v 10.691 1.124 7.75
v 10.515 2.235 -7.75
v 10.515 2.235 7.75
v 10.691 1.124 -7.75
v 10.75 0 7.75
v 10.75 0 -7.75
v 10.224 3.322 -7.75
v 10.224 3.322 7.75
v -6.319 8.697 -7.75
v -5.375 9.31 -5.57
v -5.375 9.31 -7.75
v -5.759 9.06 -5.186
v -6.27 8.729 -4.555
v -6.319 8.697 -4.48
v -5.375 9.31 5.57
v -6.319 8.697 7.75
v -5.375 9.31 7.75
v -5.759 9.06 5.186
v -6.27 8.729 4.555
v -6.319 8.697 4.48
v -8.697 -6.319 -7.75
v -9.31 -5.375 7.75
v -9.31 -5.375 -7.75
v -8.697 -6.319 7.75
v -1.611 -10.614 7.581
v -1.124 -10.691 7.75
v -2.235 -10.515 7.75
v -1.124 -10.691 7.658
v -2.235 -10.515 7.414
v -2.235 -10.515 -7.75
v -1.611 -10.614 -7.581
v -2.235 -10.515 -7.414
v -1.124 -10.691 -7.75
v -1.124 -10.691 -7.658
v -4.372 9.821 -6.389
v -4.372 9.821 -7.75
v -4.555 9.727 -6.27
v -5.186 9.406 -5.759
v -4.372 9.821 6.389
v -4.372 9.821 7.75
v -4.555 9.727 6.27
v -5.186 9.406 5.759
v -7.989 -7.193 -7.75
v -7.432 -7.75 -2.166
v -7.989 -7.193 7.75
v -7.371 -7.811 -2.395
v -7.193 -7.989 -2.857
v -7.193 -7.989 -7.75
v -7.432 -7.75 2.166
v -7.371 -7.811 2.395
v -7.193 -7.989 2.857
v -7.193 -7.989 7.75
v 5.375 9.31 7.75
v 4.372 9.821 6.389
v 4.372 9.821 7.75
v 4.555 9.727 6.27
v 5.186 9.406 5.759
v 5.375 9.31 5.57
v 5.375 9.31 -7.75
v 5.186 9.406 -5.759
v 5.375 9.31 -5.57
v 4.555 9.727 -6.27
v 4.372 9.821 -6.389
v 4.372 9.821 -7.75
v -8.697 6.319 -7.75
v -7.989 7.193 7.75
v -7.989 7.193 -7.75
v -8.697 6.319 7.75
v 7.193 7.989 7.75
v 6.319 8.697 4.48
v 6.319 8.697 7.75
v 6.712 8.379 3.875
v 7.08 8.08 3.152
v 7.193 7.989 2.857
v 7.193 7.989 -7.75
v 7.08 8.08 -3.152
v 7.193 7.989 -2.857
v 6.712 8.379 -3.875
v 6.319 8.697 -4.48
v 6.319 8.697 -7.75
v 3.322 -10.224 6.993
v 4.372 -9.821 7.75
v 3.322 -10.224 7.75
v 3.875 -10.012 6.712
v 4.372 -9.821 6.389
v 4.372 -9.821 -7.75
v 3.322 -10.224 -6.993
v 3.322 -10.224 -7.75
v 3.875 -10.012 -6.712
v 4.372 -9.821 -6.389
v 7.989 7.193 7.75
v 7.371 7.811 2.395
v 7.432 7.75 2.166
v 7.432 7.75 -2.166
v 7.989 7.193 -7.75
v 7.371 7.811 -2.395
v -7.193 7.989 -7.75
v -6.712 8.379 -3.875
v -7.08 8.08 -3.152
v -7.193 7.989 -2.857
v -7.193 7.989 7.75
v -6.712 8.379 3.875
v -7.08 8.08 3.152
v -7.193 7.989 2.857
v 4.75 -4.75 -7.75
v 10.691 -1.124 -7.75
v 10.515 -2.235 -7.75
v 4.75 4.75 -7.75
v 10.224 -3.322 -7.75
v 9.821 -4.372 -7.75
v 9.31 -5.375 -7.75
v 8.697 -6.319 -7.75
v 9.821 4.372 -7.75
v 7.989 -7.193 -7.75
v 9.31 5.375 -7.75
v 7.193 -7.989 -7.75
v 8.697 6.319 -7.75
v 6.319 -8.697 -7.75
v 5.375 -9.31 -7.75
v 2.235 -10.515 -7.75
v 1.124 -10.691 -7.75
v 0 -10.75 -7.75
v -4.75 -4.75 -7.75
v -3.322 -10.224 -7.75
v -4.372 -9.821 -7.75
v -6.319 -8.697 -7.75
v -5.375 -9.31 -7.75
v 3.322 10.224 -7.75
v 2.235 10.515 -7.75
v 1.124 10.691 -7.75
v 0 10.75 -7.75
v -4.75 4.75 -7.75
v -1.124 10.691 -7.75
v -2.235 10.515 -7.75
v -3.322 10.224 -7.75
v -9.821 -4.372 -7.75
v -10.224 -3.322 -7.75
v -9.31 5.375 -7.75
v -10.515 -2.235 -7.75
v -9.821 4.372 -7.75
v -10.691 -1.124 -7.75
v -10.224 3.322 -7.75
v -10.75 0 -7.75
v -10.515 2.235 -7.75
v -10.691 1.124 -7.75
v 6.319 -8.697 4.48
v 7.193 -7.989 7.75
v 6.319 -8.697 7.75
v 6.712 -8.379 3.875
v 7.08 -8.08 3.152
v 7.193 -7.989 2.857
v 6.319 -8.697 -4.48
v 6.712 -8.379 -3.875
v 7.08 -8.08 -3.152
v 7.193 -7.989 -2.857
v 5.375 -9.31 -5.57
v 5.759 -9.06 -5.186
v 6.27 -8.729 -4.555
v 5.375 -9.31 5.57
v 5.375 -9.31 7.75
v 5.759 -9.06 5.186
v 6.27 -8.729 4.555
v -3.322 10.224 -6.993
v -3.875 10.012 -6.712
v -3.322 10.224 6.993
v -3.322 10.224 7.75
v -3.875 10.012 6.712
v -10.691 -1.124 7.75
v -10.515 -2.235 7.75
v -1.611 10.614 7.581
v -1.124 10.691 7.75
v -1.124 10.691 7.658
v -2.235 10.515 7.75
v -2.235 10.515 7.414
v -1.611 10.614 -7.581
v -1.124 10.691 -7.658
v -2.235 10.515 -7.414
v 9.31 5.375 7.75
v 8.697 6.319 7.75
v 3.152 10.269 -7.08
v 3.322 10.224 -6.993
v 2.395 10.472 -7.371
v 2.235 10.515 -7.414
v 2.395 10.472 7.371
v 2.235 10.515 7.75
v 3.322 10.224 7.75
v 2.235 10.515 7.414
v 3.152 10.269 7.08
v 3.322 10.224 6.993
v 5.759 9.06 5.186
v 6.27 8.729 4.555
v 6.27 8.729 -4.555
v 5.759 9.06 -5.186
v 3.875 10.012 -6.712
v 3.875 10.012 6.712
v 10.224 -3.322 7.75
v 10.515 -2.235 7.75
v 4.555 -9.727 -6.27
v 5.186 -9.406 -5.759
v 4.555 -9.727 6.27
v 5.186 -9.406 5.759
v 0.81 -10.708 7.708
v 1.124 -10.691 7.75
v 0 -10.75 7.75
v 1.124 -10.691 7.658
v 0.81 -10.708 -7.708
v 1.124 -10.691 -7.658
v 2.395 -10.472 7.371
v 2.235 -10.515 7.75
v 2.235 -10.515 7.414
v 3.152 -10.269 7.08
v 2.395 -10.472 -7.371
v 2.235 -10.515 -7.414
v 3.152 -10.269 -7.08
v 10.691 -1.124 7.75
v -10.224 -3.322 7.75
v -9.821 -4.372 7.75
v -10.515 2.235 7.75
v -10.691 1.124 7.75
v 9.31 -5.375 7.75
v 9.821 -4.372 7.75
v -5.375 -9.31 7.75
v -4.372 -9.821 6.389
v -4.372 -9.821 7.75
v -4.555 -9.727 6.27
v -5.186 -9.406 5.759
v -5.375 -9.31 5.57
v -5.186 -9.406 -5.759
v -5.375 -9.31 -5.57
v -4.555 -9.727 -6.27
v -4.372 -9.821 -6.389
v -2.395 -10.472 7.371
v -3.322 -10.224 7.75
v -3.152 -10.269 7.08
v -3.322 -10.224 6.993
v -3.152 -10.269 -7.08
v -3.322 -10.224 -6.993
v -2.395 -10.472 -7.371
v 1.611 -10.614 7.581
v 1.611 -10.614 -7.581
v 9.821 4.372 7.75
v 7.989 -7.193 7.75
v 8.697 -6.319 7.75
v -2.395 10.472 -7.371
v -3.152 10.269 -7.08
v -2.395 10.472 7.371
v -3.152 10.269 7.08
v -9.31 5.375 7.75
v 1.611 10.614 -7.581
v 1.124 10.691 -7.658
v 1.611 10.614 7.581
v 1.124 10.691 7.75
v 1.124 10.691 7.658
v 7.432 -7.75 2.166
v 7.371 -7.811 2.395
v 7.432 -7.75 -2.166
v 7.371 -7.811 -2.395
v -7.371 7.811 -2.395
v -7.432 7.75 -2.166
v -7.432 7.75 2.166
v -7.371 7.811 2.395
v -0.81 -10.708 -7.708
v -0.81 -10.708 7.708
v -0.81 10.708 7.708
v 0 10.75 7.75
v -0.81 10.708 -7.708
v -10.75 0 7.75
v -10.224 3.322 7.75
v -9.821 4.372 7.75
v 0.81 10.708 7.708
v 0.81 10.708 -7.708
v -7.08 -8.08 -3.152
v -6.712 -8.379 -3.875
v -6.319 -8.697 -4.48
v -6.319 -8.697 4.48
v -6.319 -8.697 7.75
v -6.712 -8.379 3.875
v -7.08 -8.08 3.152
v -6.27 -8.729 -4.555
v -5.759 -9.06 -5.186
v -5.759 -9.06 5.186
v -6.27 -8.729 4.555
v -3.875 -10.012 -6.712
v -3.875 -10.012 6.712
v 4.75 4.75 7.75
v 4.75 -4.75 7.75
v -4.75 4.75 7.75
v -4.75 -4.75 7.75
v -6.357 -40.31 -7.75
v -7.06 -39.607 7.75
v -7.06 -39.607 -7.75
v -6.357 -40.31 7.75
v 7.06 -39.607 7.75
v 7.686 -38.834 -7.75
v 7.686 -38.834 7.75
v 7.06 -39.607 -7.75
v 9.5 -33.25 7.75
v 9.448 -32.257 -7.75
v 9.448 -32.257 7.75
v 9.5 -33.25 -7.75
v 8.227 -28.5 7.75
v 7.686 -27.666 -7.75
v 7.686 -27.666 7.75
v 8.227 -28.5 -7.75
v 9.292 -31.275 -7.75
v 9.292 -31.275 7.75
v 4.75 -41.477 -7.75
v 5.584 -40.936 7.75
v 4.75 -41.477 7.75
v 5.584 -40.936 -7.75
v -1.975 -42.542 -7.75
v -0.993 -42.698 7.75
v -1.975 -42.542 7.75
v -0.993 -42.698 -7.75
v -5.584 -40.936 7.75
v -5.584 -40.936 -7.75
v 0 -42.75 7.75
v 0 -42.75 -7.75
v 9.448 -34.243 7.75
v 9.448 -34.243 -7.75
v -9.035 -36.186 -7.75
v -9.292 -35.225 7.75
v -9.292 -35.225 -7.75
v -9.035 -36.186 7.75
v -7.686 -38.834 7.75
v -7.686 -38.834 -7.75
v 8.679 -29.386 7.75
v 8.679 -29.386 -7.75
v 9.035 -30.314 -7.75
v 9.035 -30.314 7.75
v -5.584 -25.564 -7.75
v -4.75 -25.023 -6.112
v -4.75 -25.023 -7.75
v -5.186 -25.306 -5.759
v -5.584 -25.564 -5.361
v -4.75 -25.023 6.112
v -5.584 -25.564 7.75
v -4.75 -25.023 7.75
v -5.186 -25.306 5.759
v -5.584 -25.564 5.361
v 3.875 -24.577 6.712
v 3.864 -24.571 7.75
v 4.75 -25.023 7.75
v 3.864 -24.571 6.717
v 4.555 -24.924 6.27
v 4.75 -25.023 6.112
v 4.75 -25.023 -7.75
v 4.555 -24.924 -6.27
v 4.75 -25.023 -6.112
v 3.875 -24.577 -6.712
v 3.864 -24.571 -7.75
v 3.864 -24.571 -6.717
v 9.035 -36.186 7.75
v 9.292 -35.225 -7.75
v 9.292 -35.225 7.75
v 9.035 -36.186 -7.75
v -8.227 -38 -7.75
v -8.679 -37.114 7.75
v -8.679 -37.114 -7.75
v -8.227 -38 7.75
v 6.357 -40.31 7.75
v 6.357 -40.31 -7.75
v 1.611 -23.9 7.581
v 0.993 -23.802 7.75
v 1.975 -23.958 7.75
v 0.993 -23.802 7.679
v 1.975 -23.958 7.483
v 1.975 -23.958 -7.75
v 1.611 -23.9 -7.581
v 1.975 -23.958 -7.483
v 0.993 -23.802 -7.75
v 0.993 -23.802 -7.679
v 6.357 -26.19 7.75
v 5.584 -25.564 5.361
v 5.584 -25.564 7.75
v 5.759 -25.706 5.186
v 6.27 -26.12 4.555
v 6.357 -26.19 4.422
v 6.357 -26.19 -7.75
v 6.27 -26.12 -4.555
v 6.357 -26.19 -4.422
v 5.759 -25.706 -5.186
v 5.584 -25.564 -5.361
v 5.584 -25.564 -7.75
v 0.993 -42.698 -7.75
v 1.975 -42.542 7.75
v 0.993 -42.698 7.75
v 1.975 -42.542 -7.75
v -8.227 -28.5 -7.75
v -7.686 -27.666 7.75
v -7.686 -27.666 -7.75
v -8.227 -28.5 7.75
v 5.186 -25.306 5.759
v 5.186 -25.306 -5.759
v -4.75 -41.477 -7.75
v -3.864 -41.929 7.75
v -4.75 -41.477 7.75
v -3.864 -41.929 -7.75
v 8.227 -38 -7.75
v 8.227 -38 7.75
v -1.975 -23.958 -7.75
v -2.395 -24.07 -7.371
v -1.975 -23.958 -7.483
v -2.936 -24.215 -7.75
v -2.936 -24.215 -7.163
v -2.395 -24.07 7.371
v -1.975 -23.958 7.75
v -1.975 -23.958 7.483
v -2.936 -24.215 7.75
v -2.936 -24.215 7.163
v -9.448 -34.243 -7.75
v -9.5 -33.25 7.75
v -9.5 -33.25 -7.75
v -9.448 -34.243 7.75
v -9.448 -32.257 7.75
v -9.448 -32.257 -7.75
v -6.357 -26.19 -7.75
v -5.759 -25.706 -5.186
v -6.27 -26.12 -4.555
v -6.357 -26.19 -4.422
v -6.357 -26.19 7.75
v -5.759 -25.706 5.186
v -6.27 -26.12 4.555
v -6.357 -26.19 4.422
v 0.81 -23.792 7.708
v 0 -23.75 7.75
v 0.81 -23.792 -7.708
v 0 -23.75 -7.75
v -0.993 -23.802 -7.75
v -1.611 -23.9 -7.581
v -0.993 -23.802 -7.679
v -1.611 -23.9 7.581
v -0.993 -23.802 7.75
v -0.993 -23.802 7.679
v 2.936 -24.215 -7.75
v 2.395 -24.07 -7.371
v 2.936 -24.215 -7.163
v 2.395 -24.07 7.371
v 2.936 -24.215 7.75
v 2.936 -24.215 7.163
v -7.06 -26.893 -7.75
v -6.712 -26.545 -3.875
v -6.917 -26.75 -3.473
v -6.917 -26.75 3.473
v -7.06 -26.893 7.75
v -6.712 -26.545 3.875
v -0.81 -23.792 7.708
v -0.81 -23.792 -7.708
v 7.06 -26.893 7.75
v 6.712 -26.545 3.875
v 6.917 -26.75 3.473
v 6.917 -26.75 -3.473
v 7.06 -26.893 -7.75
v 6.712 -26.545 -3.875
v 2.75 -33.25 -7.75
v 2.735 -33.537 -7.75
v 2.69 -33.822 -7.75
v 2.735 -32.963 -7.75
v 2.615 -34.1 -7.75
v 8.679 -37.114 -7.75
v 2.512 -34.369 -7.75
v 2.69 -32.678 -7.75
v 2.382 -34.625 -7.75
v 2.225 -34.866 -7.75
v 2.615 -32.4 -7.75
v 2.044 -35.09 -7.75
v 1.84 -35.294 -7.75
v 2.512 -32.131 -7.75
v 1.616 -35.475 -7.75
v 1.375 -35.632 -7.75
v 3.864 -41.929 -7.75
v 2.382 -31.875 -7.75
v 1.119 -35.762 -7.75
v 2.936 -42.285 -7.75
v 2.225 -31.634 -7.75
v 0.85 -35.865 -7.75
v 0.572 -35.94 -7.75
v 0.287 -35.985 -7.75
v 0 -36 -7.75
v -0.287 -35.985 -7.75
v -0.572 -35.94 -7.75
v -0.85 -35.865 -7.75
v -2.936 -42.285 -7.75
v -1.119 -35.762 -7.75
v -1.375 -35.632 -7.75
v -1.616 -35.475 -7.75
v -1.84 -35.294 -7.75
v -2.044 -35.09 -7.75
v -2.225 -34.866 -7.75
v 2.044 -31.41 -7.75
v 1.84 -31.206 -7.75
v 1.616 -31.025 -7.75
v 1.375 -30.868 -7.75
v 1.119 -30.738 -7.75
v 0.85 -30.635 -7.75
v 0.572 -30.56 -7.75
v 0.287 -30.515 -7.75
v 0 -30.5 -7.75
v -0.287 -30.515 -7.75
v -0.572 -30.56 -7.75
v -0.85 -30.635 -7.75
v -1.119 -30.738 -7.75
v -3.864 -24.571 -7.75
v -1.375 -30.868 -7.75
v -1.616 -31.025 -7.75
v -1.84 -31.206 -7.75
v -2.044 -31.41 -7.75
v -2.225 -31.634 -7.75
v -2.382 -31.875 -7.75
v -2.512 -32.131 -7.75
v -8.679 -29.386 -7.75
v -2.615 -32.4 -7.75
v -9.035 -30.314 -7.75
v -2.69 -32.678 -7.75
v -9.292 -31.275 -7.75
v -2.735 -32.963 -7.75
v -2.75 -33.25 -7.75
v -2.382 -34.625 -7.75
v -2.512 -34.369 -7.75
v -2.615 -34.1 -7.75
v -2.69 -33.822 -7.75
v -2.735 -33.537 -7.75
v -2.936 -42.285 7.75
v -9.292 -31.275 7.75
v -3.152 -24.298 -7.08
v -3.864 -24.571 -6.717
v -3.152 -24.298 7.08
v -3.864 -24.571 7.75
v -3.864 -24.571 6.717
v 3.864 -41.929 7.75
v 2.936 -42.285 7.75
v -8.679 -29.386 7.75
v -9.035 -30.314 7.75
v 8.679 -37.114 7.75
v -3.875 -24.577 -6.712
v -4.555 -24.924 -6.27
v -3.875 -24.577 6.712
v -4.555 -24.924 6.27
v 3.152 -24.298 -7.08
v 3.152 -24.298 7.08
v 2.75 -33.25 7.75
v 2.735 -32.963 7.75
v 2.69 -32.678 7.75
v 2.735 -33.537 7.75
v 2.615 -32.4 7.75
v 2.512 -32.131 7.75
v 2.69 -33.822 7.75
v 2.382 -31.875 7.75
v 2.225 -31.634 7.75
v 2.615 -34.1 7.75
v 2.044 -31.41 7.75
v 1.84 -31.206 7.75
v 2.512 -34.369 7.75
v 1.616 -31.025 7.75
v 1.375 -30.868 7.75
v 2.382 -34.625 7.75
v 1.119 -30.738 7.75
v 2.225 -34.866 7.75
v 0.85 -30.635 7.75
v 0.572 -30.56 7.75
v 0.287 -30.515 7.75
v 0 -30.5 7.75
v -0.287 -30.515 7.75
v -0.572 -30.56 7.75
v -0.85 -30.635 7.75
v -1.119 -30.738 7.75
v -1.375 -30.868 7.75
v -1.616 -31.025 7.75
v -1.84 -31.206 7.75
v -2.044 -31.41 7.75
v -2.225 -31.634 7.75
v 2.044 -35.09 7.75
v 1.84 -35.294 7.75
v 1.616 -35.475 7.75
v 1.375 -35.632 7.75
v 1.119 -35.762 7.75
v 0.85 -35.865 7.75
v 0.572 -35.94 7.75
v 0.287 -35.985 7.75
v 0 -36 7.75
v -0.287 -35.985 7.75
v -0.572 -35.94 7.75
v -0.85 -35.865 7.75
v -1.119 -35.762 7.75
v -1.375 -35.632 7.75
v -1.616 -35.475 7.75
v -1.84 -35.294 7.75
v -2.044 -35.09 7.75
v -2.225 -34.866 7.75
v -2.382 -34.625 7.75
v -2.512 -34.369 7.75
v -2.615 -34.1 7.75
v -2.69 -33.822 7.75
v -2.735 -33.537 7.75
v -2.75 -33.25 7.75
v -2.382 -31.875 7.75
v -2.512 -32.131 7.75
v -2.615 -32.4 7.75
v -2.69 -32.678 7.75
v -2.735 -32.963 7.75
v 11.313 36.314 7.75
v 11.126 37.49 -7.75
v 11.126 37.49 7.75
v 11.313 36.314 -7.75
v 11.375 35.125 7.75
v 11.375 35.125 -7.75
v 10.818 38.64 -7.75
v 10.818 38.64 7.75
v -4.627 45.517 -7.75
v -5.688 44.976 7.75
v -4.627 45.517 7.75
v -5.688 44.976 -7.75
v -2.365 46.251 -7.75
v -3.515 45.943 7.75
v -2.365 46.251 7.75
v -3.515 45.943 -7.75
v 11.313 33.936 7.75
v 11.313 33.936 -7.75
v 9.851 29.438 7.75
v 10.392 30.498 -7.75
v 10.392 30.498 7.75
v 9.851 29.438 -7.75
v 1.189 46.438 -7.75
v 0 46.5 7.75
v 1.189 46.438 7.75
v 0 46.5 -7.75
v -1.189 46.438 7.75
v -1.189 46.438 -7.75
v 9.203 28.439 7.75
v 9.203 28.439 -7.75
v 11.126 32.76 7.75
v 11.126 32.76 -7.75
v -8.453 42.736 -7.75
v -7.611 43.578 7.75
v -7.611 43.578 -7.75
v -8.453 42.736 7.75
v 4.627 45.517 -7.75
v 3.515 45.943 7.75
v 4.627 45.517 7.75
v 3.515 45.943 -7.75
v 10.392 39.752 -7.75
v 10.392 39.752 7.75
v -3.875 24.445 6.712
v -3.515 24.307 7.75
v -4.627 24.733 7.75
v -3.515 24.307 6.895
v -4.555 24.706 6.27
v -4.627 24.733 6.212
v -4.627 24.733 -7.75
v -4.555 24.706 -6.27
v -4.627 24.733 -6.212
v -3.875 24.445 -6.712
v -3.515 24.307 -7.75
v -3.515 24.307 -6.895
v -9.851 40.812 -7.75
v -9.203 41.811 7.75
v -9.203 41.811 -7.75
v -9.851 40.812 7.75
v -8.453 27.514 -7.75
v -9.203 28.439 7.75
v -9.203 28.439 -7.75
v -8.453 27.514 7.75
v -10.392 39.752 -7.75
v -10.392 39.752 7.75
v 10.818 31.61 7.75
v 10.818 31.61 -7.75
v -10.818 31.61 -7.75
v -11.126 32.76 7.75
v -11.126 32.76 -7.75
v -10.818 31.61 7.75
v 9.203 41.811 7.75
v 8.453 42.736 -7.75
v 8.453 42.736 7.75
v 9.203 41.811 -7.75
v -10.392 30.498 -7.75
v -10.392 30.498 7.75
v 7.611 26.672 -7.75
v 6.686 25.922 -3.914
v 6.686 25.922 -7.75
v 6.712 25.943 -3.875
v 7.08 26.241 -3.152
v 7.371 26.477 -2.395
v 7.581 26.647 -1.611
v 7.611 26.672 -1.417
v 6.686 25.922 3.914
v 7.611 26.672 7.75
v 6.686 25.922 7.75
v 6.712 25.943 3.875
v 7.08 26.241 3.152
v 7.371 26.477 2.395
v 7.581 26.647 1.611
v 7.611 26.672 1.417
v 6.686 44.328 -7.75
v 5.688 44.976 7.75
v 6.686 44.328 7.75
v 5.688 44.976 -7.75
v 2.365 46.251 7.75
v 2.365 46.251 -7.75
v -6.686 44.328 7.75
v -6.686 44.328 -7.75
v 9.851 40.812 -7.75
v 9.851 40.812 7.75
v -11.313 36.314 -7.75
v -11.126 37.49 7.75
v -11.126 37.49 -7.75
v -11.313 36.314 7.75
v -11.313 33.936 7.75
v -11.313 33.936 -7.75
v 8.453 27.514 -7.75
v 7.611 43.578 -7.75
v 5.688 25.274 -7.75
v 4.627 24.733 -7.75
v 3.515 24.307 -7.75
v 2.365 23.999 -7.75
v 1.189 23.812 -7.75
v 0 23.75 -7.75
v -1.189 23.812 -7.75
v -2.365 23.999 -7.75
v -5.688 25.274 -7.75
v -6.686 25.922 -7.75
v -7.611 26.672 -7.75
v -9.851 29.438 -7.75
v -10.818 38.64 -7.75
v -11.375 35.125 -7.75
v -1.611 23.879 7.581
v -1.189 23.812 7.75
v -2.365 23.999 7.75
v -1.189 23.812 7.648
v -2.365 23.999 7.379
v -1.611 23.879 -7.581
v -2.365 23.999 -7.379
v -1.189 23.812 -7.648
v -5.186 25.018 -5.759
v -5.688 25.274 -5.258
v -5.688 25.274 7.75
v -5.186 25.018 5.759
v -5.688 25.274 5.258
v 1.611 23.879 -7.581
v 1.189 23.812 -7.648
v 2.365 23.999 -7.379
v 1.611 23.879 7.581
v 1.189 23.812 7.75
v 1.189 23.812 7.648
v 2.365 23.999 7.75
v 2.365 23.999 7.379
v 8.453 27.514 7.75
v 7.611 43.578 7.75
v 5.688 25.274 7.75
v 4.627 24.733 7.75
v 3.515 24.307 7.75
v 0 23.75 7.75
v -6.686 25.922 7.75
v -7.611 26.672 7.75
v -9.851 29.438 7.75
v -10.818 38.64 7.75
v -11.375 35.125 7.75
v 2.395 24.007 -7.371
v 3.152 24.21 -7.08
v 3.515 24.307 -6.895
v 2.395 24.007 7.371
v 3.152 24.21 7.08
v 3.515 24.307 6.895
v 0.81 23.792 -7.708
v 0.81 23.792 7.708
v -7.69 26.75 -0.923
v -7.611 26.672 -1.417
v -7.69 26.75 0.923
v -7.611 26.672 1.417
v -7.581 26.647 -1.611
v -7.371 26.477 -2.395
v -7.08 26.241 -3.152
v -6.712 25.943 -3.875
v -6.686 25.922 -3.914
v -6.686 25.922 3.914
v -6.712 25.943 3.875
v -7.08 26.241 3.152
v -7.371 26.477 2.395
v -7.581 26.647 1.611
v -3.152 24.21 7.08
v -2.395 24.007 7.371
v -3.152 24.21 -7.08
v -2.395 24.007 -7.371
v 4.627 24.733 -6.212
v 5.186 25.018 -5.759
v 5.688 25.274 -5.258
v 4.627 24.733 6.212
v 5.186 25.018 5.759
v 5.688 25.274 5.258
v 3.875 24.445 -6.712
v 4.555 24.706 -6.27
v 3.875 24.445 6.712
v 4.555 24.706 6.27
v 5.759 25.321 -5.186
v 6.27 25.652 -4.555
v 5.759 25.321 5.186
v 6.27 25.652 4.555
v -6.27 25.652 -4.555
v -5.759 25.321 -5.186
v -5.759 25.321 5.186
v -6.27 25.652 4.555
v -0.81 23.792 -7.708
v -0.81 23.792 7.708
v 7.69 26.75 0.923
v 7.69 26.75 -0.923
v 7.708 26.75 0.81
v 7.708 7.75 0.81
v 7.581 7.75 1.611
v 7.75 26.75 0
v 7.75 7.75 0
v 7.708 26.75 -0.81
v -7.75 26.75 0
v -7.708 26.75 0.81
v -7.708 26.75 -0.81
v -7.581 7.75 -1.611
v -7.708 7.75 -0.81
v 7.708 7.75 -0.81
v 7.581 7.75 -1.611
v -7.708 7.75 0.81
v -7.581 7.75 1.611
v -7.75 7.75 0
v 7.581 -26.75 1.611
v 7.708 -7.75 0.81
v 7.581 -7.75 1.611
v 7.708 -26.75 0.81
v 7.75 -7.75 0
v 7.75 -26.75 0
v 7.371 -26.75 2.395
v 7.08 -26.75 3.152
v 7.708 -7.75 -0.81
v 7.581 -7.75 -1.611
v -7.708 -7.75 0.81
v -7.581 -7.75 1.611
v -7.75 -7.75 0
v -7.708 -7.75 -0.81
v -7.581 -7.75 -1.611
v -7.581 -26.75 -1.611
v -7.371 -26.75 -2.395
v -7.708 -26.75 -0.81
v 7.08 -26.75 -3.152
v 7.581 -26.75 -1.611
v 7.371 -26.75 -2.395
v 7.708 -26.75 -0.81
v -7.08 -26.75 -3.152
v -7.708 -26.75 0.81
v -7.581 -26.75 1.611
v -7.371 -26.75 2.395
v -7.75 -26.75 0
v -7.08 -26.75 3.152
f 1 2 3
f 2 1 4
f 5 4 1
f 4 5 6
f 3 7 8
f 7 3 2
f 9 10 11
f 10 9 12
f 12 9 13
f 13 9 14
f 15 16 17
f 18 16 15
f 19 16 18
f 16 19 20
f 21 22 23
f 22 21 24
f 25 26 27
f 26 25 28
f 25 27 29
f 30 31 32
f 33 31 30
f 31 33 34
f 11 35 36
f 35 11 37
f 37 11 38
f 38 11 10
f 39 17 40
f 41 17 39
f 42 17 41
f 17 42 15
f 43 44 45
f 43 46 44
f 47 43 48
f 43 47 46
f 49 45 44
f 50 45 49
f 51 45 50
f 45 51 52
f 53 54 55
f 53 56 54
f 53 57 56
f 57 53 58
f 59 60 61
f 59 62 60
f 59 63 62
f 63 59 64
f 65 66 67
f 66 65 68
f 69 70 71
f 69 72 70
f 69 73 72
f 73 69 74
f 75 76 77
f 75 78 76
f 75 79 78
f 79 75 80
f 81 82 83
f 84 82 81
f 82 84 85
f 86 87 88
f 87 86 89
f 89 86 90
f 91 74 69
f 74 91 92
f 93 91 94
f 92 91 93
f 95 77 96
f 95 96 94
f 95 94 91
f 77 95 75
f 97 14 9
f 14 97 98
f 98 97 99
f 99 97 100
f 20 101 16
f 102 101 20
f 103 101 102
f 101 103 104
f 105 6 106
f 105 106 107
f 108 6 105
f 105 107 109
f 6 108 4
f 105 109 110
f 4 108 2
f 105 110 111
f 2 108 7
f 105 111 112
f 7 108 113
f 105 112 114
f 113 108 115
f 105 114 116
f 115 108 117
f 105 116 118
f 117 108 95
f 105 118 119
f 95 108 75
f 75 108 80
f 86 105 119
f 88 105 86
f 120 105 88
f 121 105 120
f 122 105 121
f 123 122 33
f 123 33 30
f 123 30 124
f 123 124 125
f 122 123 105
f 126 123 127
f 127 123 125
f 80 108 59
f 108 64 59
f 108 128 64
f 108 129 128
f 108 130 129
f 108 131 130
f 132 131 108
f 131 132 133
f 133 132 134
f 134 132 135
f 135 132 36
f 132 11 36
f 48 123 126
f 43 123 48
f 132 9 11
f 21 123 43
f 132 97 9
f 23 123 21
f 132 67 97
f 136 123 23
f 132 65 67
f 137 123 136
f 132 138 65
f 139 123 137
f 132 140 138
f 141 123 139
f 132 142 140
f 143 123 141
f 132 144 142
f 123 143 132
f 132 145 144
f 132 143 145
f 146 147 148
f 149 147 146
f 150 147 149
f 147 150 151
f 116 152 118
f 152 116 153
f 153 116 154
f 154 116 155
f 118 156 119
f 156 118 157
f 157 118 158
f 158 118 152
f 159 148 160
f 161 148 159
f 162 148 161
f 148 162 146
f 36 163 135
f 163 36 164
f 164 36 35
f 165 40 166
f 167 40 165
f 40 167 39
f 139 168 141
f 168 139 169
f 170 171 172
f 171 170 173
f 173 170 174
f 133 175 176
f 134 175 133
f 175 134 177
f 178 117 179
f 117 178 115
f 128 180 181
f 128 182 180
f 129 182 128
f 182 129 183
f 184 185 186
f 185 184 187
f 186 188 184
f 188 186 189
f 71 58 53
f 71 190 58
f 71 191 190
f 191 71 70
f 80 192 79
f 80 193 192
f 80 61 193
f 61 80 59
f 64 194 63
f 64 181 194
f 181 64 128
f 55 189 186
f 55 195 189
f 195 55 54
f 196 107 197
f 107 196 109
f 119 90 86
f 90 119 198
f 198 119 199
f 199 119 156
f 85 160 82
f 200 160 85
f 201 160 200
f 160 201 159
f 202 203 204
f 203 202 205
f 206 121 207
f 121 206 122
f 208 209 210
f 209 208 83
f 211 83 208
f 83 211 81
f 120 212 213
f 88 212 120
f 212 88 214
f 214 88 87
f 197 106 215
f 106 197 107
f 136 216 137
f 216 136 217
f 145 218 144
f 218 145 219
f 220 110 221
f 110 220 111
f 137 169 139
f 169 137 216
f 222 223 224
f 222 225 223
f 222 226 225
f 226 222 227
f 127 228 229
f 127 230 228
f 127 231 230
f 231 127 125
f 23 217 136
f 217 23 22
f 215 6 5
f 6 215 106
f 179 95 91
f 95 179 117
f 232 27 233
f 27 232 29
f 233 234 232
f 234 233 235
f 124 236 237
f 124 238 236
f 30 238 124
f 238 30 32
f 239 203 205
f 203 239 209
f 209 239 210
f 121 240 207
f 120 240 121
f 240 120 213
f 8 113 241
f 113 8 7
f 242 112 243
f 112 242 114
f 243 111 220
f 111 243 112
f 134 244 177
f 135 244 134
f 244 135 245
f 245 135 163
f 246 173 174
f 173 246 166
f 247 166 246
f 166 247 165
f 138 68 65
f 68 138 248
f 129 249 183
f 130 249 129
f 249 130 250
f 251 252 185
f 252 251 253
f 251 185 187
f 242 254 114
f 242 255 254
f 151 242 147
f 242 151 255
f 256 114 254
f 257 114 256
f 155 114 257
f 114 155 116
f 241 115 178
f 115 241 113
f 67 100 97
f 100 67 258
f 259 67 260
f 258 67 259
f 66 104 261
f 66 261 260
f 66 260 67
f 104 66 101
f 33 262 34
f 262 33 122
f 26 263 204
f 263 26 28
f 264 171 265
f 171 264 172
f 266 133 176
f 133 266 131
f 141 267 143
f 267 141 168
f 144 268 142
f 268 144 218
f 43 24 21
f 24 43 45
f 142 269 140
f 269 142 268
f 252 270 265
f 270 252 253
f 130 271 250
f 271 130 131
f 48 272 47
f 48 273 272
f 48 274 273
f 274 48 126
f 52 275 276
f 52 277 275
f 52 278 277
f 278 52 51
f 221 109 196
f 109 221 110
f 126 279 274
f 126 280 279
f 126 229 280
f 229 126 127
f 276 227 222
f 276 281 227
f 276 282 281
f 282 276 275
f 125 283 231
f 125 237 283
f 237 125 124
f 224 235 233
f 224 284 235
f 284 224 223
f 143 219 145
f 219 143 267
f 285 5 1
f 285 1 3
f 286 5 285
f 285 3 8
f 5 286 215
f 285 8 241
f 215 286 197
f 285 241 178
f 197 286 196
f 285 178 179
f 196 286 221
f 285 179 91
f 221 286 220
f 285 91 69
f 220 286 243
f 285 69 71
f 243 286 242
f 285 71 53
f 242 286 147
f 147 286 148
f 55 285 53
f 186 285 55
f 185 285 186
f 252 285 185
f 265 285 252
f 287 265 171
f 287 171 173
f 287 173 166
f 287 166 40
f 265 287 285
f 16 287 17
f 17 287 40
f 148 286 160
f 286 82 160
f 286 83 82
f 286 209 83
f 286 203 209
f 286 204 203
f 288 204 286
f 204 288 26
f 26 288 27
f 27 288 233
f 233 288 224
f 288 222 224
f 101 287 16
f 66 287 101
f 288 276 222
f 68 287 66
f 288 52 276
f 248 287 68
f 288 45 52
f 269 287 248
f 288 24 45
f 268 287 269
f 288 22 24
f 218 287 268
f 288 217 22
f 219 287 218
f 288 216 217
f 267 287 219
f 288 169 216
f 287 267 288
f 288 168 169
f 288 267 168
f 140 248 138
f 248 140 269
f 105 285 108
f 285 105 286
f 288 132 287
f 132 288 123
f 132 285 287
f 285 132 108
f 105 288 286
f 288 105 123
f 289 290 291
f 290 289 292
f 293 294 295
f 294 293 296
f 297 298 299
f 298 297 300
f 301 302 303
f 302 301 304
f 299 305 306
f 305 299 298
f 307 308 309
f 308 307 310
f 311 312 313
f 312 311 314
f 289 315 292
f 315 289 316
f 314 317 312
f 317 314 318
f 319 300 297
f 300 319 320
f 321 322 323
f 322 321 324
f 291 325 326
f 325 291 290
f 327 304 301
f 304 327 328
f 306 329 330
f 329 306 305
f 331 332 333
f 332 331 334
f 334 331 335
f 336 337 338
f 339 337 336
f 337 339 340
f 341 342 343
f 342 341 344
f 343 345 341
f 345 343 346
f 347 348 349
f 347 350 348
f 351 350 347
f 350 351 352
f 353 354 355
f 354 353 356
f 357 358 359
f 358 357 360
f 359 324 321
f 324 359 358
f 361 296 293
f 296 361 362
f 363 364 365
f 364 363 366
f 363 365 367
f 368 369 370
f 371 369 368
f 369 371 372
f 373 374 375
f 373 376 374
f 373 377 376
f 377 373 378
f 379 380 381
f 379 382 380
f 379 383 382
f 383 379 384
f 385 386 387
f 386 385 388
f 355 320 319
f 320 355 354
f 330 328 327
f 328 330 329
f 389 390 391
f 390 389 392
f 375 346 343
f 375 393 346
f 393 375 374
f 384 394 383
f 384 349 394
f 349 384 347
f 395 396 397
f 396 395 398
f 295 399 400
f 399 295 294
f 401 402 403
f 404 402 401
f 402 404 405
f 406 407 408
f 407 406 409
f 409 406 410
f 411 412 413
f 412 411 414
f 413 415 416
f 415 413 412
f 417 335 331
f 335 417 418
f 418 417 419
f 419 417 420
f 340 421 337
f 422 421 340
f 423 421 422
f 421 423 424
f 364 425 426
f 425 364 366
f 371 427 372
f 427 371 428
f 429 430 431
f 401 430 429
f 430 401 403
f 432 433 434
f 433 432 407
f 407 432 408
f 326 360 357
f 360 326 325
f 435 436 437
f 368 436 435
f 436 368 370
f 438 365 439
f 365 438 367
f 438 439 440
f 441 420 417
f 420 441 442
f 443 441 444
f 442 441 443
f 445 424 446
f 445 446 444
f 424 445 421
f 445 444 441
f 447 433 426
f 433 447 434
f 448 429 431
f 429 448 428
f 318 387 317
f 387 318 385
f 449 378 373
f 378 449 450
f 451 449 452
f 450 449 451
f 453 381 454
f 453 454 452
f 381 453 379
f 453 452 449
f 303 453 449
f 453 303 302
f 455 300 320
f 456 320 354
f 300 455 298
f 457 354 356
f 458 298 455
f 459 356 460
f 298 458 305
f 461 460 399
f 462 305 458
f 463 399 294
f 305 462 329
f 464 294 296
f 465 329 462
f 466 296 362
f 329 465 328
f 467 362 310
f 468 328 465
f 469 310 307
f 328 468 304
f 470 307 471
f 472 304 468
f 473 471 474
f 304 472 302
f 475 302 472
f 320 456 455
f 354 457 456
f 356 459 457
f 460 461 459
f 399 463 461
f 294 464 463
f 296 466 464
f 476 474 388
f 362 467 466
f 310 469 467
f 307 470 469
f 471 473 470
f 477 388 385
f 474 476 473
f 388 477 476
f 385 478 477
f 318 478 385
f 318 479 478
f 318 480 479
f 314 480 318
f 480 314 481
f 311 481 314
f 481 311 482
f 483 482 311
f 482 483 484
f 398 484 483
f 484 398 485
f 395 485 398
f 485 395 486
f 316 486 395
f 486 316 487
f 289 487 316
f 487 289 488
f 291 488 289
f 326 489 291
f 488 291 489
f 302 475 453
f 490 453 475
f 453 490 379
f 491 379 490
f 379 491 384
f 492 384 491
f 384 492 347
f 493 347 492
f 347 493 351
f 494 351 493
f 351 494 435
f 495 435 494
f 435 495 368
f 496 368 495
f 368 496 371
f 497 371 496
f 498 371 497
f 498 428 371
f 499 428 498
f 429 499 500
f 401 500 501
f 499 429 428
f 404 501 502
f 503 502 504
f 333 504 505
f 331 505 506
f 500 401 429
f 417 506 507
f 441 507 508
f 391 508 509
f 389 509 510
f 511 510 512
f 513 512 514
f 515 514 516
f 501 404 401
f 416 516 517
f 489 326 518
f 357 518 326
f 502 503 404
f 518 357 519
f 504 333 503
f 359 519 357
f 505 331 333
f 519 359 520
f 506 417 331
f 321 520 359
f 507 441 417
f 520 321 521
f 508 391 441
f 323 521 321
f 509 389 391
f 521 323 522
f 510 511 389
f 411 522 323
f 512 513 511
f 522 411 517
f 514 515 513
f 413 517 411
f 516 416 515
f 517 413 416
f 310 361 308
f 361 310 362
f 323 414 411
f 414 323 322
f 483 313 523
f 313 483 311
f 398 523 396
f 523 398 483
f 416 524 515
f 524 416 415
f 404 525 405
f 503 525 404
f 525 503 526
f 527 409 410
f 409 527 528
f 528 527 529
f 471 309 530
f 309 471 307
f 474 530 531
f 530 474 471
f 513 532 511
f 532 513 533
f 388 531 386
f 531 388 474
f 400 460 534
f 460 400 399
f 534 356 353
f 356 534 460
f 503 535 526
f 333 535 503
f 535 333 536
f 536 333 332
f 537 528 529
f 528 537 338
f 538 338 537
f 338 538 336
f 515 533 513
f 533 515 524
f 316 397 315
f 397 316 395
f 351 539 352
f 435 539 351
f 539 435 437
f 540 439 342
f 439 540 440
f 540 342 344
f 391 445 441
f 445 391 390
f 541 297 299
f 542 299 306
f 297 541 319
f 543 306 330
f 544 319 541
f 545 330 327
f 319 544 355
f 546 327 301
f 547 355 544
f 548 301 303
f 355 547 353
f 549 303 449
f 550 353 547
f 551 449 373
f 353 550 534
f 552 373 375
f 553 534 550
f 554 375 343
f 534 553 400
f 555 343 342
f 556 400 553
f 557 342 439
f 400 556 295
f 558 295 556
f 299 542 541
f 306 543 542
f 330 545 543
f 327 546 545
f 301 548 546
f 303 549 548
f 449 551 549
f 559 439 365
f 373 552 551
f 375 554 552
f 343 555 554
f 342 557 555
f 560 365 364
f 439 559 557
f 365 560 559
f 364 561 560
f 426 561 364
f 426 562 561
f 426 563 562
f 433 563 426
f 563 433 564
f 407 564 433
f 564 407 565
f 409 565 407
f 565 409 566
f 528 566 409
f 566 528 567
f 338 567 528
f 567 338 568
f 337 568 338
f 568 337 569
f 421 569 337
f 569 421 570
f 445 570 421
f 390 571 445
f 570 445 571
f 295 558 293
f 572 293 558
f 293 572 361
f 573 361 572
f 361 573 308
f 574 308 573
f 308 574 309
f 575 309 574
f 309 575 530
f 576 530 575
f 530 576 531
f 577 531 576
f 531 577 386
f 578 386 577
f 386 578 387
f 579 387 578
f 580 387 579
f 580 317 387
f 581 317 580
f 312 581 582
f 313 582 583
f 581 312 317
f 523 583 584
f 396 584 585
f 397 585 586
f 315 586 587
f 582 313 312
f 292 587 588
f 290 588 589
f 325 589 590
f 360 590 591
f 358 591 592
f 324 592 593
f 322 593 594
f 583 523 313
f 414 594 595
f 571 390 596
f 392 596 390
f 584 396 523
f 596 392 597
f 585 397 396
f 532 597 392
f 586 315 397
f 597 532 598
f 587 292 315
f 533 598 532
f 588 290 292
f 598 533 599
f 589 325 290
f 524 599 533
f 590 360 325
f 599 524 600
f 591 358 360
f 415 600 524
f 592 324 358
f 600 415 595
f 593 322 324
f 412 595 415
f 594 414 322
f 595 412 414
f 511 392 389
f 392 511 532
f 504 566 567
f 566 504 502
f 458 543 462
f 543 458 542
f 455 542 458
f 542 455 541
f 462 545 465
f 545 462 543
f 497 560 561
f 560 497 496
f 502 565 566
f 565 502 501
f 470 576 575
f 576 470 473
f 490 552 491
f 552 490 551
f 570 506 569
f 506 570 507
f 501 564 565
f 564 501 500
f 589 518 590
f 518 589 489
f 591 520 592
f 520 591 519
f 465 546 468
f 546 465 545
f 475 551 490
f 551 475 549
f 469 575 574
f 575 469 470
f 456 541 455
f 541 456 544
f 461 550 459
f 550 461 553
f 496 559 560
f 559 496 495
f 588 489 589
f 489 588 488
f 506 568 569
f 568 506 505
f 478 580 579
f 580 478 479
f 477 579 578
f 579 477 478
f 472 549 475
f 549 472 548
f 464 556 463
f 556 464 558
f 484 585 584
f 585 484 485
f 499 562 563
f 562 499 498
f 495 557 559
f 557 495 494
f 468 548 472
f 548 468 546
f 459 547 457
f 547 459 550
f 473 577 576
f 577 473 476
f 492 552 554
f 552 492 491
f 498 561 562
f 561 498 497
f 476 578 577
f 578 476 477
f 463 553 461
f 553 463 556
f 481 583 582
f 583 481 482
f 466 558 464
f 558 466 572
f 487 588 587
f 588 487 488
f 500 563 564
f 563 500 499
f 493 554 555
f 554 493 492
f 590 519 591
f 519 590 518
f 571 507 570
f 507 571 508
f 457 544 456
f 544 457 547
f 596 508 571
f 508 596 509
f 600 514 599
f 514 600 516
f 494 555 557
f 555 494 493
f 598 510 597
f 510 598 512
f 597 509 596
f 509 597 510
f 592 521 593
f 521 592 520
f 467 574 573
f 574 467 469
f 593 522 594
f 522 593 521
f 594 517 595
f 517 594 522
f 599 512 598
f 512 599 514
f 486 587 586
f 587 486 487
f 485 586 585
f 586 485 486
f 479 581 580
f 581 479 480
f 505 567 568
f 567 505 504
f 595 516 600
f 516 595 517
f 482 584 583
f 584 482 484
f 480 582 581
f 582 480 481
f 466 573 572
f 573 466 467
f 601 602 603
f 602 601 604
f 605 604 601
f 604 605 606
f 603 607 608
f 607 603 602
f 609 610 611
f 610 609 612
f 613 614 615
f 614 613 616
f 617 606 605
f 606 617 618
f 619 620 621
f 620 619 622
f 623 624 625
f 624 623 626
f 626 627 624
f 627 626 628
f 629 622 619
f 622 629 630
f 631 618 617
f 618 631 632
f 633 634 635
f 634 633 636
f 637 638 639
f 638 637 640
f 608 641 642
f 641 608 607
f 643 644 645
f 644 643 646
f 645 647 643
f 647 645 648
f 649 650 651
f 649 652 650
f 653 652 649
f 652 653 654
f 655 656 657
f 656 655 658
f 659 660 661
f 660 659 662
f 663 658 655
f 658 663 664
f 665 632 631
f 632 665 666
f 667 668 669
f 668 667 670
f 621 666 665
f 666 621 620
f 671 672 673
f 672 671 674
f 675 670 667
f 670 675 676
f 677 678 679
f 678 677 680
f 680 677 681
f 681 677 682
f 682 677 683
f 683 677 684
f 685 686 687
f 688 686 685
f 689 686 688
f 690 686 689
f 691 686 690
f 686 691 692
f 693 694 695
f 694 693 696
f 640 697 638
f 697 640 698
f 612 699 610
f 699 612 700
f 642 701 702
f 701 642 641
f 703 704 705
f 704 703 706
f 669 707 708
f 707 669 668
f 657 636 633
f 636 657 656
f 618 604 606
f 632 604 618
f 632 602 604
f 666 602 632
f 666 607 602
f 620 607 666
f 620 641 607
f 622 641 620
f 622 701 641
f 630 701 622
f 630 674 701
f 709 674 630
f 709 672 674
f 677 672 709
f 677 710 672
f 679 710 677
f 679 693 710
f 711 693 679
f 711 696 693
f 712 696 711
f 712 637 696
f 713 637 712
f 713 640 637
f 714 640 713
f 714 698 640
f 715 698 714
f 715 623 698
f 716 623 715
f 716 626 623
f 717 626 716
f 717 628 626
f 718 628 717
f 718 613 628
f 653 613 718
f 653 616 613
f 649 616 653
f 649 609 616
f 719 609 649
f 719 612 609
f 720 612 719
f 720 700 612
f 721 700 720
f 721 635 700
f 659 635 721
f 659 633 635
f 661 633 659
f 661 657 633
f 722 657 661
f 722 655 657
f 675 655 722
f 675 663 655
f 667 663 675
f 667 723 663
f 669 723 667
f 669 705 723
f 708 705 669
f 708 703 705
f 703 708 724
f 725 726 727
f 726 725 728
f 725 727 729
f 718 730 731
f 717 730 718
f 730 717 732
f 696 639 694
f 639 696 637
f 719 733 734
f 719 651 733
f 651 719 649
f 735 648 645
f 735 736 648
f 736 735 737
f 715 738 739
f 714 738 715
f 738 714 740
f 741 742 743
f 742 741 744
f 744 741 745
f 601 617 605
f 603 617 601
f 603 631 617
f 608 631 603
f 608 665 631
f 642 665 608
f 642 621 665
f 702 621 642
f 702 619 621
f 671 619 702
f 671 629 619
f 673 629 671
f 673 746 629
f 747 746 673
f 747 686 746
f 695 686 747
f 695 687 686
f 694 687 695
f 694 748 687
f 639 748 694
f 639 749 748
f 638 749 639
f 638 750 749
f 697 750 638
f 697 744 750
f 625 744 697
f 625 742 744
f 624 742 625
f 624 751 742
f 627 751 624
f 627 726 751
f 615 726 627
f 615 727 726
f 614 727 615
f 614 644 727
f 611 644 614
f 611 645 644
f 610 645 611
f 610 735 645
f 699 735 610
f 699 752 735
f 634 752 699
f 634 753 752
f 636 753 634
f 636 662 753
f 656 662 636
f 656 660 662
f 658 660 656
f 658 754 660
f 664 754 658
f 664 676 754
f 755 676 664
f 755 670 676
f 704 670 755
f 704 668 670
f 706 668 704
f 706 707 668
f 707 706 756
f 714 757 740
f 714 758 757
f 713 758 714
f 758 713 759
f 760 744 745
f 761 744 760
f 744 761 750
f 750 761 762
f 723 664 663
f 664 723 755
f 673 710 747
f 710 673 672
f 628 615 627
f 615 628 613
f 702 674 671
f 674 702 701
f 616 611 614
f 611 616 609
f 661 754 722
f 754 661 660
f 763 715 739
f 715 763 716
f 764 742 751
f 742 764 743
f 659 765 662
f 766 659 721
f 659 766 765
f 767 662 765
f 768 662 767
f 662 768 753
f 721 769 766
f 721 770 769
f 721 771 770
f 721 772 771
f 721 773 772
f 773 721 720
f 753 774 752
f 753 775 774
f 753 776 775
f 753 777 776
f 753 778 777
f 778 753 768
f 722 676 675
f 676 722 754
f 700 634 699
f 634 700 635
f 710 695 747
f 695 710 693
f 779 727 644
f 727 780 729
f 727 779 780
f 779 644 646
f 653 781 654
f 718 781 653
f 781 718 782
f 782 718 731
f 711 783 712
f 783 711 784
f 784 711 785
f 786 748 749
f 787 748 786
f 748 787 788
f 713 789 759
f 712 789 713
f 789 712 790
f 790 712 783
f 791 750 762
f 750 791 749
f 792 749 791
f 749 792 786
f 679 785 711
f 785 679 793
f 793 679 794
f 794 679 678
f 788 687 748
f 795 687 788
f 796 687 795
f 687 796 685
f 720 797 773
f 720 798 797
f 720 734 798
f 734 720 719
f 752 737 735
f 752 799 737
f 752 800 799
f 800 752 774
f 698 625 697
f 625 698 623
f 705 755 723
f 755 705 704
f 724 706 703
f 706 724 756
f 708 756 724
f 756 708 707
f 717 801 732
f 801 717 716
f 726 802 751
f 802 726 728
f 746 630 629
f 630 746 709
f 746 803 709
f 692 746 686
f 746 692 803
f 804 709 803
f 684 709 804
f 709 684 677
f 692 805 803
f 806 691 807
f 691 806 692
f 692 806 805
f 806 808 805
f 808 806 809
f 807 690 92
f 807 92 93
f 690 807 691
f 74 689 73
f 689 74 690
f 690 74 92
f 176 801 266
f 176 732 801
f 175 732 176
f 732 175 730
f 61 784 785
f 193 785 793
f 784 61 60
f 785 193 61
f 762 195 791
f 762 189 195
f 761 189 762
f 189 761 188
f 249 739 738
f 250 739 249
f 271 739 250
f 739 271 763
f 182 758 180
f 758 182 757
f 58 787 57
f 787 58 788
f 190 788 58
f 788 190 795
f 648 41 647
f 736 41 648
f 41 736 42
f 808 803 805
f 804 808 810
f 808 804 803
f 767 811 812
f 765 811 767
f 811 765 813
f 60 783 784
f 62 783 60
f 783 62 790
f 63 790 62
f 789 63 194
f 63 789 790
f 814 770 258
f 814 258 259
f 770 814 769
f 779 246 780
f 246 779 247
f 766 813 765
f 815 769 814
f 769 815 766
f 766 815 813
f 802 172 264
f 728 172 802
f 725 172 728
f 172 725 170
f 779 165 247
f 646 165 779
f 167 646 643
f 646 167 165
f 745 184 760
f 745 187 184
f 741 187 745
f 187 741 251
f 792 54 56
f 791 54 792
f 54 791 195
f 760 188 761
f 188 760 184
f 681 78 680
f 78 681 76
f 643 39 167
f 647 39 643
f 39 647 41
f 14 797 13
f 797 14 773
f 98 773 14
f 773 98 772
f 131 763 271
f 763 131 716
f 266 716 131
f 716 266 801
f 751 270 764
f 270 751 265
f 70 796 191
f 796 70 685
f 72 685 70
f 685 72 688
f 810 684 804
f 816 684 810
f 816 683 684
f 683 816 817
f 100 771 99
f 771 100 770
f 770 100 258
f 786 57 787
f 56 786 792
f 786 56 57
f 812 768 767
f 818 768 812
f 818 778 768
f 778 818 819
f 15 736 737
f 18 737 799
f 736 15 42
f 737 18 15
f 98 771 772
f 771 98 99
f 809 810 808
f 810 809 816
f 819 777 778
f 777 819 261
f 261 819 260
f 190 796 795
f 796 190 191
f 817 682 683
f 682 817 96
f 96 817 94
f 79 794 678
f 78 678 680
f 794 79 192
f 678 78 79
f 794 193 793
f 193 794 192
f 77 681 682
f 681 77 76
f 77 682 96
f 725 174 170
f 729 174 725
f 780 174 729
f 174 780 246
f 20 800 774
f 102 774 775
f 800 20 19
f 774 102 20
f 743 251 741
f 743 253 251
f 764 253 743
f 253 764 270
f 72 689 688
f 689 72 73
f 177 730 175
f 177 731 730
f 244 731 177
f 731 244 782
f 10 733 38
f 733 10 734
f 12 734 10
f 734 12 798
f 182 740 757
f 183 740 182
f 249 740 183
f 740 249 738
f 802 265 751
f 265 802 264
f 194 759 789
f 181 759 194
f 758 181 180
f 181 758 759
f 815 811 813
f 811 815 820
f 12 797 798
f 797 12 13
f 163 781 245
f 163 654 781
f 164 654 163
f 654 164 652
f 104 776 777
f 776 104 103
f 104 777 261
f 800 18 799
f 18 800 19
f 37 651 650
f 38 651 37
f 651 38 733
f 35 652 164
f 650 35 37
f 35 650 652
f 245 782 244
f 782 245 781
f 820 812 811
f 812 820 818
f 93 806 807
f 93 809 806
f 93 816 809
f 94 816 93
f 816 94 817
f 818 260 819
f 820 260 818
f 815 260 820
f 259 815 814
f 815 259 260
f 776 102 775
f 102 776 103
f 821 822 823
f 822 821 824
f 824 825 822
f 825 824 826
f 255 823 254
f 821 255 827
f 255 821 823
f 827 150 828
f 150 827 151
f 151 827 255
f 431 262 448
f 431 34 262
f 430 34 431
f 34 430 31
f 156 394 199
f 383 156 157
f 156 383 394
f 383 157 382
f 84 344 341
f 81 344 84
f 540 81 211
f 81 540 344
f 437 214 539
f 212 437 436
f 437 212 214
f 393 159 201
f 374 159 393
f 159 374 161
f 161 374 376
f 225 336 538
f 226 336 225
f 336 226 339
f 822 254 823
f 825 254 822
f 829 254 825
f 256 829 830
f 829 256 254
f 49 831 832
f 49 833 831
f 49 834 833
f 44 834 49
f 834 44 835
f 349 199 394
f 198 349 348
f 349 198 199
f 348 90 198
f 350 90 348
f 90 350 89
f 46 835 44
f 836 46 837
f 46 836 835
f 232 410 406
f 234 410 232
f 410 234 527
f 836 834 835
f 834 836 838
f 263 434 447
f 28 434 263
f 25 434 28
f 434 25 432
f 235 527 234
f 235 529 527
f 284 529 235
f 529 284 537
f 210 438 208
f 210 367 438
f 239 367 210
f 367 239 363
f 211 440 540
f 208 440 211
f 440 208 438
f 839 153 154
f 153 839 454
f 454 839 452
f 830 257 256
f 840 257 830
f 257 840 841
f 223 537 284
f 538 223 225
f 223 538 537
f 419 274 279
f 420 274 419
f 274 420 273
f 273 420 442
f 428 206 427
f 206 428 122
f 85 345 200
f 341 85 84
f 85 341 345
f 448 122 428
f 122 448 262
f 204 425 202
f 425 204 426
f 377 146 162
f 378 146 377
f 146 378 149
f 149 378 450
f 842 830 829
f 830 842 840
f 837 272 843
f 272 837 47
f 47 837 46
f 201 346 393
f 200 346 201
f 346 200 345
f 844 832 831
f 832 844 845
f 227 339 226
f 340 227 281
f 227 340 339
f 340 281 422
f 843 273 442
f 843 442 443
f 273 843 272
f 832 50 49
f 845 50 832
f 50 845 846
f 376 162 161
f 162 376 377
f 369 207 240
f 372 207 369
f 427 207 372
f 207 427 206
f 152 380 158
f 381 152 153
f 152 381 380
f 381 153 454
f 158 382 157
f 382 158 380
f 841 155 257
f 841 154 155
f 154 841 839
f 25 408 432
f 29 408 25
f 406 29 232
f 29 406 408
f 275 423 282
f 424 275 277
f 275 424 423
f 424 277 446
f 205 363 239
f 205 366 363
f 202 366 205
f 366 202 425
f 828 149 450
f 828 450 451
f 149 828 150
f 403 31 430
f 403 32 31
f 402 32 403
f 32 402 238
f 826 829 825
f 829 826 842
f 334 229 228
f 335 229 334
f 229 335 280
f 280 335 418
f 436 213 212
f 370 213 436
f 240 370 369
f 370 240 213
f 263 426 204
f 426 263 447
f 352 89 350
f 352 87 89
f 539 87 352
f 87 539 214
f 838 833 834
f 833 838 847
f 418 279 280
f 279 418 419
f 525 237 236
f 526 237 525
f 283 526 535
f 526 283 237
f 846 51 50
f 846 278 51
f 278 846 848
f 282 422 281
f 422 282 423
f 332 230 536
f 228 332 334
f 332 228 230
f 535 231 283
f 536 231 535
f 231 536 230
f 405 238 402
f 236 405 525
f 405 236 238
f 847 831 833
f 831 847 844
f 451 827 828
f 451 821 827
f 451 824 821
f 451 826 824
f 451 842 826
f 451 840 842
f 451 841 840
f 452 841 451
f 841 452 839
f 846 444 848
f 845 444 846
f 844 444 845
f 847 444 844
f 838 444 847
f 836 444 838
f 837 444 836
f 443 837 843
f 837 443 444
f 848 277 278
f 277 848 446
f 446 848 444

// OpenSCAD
//hole
pegL=9.5;
pegW=9.5;
pegH=15.5;
//middle cylinder
mcH=pegH;
mcD=21.5;
//large cylinder
lcH=pegH;
lcD=22.75;
//small cylinder w hole
scH=pegH;
scD=19;
handleH=pegH;
handleD=5.5;
//distance between ends of cylinders
dist=13;
//connection cylinders
conH=dist+(.5*mcD-.5*pegL);
conD=pegH;
res=60;

union(){
difference(){
cylinder(h=mcH, d=mcD, center=true, $fn=res);
cube([pegL,pegW,pegH], center=true);
}

translate([0,(.5*mcD)+(.5*lcD)+dist,0])
cylinder(h=lcH, d=lcD, center=true, $fn=res);

translate([0,(.5*dist+.5*mcD),0])
rotate([90,0,0])
cylinder(h=conH, d=conD, center=true, $fn=res);

translate([0,-(.5*dist+.5*mcD),0])
rotate([90,0,0])
cylinder(h=conH, d=conD, center=true, $fn=res);

translate([0,-((.5*mcD)+(.5*scD)+dist),0])
difference(){
    cylinder(h=scH, d=scD, center=true, $fn=res);
    cylinder(h=handleH, d=handleD, center=true, $fn=res);
}
}
